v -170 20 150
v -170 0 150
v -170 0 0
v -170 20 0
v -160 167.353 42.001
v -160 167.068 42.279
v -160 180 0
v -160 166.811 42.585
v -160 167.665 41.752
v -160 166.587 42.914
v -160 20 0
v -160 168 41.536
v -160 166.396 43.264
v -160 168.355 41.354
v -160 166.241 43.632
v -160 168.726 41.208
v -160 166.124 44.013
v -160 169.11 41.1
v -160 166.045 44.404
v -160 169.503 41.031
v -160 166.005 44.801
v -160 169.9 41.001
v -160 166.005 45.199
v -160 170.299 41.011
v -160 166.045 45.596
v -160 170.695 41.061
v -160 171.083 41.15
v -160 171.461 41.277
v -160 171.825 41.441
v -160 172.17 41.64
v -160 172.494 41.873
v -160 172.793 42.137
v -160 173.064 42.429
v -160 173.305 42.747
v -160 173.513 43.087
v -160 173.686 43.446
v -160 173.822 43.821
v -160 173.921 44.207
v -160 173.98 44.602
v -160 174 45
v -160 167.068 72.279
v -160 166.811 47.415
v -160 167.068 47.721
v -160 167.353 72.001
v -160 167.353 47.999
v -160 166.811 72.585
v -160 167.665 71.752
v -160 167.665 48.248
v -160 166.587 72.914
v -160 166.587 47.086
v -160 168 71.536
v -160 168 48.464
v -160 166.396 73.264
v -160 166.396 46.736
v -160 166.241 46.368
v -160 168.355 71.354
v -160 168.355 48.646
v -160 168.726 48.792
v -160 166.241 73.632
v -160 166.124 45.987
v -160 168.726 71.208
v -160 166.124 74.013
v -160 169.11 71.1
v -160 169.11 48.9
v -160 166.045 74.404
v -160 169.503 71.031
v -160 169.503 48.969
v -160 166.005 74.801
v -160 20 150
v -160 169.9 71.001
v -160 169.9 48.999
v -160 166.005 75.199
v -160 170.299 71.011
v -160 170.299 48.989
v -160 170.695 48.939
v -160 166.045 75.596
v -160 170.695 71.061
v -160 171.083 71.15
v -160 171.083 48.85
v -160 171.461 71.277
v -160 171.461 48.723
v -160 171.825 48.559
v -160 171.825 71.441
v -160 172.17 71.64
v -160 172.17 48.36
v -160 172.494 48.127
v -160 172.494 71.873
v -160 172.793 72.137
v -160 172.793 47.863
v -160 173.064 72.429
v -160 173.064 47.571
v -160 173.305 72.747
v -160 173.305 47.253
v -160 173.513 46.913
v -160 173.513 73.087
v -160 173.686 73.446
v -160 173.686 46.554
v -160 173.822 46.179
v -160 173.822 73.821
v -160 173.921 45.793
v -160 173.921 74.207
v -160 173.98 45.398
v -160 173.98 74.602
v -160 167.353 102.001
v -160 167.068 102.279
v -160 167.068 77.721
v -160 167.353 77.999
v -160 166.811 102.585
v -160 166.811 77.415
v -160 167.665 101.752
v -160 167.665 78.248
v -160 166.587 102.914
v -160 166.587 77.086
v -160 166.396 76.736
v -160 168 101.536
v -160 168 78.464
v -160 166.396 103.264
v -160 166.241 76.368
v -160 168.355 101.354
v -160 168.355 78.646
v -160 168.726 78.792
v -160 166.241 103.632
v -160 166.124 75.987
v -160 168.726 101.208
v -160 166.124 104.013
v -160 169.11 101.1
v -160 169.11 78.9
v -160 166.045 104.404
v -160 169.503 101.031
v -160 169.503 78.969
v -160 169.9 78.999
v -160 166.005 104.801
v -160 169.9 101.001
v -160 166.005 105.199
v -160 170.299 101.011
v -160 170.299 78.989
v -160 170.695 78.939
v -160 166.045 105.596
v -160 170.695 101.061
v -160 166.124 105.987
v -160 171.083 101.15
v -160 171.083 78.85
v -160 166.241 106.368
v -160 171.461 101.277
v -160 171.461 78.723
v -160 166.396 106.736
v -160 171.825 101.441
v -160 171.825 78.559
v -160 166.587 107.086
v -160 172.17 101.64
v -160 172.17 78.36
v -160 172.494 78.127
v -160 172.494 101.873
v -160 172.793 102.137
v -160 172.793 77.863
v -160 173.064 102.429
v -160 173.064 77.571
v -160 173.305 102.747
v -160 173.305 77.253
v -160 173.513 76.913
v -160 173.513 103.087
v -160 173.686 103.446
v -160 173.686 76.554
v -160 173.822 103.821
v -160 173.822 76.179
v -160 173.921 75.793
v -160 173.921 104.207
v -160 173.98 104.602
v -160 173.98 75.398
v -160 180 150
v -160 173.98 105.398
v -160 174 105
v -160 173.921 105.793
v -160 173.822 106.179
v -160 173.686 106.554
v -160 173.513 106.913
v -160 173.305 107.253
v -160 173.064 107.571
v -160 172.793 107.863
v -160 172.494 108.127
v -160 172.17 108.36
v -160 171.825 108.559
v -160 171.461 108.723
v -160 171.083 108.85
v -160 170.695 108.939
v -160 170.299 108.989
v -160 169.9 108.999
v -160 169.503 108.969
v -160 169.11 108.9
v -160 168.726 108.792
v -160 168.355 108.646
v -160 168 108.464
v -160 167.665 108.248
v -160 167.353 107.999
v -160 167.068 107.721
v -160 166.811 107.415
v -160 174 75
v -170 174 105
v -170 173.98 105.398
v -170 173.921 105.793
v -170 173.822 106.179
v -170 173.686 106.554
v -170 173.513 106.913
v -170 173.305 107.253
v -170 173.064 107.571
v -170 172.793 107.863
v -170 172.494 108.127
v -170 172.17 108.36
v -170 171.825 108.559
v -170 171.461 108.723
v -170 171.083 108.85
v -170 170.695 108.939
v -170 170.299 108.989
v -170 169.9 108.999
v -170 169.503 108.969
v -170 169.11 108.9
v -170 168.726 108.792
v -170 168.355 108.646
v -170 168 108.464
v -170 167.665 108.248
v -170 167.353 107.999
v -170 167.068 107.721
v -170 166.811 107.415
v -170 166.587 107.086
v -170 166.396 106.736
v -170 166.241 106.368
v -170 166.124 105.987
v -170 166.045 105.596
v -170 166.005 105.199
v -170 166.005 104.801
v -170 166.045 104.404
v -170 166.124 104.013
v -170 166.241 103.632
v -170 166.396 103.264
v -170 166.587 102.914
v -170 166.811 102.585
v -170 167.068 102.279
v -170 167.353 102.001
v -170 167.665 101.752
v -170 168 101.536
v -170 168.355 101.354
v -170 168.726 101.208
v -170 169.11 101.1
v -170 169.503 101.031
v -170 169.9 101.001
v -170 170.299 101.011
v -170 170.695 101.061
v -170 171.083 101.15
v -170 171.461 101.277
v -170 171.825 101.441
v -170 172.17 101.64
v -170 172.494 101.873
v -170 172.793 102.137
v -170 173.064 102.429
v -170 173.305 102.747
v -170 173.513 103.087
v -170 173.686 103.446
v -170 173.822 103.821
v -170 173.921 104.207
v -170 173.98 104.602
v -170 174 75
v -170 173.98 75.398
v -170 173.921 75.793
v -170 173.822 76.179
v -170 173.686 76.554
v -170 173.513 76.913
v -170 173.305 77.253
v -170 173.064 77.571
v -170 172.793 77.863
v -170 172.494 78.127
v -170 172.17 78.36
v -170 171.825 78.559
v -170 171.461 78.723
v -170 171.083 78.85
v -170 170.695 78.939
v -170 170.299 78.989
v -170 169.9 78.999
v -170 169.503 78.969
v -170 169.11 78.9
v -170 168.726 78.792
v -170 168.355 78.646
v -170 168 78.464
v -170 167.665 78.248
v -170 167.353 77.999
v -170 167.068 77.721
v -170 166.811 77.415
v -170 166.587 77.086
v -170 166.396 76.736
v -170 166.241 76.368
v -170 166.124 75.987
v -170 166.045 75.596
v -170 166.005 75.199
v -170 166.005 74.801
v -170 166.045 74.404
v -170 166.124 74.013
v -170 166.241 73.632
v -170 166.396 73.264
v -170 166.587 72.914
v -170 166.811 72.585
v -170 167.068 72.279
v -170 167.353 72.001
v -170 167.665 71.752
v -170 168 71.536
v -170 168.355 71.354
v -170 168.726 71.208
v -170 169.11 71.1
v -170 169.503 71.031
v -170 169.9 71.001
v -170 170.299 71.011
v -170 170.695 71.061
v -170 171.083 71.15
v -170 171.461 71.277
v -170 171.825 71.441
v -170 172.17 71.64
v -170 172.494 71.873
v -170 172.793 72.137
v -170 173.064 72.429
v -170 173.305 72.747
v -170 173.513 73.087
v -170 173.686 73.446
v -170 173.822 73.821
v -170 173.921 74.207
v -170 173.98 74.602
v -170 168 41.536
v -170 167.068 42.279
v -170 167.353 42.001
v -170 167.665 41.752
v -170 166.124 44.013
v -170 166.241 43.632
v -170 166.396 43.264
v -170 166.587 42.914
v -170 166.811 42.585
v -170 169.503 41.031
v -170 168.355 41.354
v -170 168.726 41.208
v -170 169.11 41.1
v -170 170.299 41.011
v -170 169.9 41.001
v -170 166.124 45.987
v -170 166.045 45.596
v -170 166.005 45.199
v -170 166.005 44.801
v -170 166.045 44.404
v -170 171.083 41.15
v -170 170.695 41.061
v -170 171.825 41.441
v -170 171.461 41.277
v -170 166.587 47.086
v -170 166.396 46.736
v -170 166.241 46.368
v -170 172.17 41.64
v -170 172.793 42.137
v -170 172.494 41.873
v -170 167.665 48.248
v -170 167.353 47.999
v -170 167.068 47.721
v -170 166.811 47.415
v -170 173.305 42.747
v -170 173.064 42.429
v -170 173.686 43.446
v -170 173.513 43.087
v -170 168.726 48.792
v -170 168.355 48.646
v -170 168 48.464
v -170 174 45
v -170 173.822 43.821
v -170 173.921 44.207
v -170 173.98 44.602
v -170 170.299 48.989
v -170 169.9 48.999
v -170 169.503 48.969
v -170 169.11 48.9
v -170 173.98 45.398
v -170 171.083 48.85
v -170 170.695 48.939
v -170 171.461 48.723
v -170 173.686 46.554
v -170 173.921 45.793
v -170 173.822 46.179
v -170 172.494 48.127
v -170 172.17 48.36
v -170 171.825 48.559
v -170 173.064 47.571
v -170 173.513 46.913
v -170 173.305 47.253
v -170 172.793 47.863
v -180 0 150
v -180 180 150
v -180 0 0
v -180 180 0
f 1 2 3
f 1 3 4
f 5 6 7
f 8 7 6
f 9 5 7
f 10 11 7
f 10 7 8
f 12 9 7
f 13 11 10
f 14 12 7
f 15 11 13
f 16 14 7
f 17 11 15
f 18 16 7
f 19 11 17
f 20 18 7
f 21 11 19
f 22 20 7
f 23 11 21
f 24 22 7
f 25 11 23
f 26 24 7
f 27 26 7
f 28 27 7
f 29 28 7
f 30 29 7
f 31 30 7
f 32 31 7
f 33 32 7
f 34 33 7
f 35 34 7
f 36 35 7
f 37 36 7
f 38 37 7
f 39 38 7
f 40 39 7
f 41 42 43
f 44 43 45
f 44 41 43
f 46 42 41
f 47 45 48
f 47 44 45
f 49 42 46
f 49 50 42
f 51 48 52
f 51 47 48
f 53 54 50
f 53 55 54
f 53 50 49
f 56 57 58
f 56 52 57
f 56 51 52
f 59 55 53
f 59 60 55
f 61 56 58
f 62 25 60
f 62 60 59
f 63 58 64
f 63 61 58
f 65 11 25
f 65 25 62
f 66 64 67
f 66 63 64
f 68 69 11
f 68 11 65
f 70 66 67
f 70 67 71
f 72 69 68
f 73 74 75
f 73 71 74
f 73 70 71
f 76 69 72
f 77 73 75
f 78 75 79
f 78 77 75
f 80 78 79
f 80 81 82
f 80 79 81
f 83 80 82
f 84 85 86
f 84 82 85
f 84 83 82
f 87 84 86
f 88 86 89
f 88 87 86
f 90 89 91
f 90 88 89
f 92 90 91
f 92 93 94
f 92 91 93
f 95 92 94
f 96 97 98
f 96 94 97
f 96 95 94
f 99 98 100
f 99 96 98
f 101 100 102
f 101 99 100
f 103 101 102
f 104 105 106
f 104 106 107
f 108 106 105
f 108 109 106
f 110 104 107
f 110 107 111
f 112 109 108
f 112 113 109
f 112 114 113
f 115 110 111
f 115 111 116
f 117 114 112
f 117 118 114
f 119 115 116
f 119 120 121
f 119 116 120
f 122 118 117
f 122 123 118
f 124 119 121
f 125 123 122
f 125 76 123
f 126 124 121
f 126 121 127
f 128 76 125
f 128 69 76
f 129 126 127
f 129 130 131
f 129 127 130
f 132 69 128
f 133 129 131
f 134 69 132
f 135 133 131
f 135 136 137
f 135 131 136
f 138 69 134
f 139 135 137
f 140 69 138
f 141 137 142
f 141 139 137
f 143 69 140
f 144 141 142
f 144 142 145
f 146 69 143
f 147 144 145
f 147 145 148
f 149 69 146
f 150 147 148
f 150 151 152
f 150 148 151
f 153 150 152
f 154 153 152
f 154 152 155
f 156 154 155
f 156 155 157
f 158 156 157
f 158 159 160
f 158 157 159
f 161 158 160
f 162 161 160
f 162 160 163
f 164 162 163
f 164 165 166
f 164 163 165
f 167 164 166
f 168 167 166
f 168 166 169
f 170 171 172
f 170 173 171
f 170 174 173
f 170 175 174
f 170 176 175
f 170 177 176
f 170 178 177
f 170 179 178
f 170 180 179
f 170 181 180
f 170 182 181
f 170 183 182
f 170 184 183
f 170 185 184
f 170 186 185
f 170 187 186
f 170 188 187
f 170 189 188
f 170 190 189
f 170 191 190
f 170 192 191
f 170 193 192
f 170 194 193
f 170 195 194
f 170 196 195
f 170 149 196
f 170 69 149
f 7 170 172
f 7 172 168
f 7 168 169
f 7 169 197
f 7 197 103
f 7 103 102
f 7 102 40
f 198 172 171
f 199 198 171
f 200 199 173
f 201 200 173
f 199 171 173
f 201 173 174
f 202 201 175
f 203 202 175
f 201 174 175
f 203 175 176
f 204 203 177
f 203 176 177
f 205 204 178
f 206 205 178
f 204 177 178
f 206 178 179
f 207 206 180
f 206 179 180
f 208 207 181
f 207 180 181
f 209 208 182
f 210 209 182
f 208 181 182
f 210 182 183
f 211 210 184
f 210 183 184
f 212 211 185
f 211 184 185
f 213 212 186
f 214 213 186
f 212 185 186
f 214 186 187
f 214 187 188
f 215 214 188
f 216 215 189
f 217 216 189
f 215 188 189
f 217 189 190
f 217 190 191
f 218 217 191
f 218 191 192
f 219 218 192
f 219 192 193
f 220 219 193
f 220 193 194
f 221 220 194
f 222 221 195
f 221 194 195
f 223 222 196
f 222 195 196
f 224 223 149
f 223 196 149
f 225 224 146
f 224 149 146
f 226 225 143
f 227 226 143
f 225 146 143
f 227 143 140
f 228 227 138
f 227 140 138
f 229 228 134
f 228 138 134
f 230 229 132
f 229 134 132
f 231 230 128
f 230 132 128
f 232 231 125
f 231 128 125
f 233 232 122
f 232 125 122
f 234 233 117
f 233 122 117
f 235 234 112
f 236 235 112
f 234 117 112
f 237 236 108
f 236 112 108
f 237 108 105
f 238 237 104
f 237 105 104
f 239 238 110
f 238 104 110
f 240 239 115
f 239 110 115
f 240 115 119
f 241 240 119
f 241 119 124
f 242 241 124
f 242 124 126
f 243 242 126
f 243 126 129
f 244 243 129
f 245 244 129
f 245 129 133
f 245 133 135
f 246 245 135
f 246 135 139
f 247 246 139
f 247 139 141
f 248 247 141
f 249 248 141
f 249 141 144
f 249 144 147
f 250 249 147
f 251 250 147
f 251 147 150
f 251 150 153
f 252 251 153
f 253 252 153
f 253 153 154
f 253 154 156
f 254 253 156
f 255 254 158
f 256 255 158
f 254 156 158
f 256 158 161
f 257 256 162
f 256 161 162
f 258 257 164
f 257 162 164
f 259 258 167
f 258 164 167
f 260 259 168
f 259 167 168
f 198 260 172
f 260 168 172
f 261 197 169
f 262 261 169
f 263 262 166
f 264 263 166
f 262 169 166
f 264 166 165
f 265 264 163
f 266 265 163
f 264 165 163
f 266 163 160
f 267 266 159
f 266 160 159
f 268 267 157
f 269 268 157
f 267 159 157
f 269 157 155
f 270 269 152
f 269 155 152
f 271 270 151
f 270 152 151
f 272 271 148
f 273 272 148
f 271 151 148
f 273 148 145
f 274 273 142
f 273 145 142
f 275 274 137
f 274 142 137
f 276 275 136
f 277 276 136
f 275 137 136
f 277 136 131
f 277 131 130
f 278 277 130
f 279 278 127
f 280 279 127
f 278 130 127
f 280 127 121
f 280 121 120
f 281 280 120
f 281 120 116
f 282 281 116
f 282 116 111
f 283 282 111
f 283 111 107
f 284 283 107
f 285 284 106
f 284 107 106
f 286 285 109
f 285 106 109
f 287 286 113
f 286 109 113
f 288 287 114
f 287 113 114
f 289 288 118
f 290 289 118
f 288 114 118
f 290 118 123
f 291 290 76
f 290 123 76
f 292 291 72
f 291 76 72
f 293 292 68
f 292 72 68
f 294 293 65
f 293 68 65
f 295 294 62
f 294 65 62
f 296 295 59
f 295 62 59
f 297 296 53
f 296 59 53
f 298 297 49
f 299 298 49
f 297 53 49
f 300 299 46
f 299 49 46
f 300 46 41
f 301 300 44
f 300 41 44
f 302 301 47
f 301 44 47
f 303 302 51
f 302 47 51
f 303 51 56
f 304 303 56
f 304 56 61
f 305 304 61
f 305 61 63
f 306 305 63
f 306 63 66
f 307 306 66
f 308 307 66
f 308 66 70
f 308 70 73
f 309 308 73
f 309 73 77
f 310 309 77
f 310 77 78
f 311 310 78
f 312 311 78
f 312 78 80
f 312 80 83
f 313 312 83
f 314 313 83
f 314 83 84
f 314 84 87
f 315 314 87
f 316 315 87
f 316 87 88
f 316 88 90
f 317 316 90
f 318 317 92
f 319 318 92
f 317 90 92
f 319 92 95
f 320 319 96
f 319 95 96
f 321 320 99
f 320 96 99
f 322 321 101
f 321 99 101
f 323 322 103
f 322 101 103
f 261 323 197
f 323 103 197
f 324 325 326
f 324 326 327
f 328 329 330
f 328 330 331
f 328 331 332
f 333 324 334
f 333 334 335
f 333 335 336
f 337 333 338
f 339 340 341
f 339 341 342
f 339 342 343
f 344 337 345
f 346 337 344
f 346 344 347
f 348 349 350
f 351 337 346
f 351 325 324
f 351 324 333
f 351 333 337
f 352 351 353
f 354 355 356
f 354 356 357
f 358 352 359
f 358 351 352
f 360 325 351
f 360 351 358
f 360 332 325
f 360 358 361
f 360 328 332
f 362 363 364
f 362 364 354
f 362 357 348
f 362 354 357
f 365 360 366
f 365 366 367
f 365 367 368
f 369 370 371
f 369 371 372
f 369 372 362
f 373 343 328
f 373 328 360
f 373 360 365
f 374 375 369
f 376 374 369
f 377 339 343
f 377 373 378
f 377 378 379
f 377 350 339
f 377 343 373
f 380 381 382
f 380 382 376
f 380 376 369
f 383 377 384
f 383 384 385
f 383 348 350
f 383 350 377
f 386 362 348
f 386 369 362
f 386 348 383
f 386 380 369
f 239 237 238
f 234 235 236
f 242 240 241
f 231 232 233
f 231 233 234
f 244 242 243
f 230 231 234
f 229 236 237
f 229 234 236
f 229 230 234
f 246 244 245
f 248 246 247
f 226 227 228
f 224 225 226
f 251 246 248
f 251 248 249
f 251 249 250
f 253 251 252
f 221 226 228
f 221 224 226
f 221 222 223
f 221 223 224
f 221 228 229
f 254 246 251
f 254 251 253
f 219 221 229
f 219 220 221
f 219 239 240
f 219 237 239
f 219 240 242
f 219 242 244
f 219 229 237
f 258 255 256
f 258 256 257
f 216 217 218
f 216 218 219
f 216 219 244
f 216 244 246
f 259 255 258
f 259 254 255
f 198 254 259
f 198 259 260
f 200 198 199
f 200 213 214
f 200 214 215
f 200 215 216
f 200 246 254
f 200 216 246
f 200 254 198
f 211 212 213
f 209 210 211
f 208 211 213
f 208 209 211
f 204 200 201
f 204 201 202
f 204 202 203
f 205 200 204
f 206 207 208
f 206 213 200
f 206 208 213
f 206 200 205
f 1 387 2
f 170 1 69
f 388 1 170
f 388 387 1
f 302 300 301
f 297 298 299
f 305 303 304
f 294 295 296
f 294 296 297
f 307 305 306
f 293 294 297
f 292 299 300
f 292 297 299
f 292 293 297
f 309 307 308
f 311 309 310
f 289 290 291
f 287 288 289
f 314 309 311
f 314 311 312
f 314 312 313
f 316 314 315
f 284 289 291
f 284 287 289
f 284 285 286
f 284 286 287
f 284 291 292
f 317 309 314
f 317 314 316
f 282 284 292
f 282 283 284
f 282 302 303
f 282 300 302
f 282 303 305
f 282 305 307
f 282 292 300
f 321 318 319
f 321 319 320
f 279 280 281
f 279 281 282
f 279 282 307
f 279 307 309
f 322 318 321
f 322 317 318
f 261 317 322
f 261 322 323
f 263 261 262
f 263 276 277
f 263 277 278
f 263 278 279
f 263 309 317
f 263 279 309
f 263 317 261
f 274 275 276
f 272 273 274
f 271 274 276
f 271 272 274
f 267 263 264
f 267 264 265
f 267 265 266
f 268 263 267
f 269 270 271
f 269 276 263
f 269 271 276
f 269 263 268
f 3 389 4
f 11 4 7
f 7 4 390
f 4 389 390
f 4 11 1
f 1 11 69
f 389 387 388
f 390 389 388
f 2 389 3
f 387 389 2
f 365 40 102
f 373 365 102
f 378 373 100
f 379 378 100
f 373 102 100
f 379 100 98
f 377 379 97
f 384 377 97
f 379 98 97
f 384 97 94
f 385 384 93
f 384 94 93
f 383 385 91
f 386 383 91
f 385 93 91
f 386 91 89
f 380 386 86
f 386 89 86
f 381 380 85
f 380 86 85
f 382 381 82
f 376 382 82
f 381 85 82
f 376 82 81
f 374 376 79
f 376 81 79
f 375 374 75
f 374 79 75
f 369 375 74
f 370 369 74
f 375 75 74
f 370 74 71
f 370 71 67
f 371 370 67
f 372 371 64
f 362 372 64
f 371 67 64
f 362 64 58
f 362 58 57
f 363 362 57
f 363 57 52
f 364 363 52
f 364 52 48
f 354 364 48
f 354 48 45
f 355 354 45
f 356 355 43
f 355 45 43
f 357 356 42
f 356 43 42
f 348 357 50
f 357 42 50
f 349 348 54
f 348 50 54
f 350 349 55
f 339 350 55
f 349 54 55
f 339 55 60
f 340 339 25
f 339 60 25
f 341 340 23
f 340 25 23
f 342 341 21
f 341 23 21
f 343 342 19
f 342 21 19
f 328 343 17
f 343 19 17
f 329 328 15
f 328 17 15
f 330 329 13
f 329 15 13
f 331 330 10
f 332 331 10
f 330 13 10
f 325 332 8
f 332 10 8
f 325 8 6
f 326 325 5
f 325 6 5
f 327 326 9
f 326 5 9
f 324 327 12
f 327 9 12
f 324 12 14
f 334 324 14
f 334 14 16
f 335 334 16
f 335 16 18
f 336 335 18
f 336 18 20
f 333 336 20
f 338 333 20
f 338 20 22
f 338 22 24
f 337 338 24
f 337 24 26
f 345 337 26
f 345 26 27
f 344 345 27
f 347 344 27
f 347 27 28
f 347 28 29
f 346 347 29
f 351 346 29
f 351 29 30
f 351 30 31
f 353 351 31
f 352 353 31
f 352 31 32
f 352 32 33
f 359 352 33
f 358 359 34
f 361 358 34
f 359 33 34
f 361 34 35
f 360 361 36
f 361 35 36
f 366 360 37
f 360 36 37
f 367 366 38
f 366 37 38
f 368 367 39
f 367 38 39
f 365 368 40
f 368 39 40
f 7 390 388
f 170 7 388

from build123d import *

# Parameters (mm, degrees)
F0_W     = 180
F0_H     = 150
F1_DEPTH = 20
F2_R     = 4
F3_DEPTH = 10
F4_W     = 20
F4_H     = 150
F5_DEPTH = 10
F6_ANGLE = 90


with BuildPart() as f1:
    # F0 (on Front) → F1 (new body)
    with BuildSketch(Plane.XZ):
        with Locations((-90, 75)):
            Rectangle(F0_W, F0_H)
    extrude(amount=F1_DEPTH)

    # F2 (on face) → F3 (cut)
    with BuildSketch(Plane.XZ.offset(20)):
        with Locations((-10, 105)):
            Circle(F2_R)
        with Locations((-10, 75)):
            Circle(F2_R)
        with Locations((-10, 45)):
            Circle(F2_R)
    extrude(amount=-F3_DEPTH, mode=Mode.SUBTRACT)

    # F4 (on face) → F5 (cut)
    with BuildSketch(Plane.XZ.offset(20)):
        with Locations((-170, 75)):
            Rectangle(F4_W, F4_H)
    extrude(amount=-F5_DEPTH, mode=Mode.SUBTRACT)


with BuildPart() as f1_1:
    # F6: moved
    add(f1.part.rotate(Axis((-180, 0, 75), (0, 0, 1)), F6_ANGLE))


solid = f1_1.part
